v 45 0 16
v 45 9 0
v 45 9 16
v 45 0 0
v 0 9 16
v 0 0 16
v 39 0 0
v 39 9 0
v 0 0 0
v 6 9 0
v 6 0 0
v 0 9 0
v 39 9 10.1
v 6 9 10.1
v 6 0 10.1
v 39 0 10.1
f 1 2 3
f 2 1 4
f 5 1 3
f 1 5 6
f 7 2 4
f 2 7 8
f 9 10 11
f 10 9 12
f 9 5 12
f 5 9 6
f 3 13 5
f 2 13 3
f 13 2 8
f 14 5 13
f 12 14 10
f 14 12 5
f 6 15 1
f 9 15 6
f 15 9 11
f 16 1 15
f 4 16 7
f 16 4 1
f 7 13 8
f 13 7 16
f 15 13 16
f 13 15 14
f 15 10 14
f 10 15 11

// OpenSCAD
//MAX7219 Holder
$fn=40;

difference(){
cube([45,9,16]);
translate([6,-1,0])
cube([33,15,10.1]);
}
